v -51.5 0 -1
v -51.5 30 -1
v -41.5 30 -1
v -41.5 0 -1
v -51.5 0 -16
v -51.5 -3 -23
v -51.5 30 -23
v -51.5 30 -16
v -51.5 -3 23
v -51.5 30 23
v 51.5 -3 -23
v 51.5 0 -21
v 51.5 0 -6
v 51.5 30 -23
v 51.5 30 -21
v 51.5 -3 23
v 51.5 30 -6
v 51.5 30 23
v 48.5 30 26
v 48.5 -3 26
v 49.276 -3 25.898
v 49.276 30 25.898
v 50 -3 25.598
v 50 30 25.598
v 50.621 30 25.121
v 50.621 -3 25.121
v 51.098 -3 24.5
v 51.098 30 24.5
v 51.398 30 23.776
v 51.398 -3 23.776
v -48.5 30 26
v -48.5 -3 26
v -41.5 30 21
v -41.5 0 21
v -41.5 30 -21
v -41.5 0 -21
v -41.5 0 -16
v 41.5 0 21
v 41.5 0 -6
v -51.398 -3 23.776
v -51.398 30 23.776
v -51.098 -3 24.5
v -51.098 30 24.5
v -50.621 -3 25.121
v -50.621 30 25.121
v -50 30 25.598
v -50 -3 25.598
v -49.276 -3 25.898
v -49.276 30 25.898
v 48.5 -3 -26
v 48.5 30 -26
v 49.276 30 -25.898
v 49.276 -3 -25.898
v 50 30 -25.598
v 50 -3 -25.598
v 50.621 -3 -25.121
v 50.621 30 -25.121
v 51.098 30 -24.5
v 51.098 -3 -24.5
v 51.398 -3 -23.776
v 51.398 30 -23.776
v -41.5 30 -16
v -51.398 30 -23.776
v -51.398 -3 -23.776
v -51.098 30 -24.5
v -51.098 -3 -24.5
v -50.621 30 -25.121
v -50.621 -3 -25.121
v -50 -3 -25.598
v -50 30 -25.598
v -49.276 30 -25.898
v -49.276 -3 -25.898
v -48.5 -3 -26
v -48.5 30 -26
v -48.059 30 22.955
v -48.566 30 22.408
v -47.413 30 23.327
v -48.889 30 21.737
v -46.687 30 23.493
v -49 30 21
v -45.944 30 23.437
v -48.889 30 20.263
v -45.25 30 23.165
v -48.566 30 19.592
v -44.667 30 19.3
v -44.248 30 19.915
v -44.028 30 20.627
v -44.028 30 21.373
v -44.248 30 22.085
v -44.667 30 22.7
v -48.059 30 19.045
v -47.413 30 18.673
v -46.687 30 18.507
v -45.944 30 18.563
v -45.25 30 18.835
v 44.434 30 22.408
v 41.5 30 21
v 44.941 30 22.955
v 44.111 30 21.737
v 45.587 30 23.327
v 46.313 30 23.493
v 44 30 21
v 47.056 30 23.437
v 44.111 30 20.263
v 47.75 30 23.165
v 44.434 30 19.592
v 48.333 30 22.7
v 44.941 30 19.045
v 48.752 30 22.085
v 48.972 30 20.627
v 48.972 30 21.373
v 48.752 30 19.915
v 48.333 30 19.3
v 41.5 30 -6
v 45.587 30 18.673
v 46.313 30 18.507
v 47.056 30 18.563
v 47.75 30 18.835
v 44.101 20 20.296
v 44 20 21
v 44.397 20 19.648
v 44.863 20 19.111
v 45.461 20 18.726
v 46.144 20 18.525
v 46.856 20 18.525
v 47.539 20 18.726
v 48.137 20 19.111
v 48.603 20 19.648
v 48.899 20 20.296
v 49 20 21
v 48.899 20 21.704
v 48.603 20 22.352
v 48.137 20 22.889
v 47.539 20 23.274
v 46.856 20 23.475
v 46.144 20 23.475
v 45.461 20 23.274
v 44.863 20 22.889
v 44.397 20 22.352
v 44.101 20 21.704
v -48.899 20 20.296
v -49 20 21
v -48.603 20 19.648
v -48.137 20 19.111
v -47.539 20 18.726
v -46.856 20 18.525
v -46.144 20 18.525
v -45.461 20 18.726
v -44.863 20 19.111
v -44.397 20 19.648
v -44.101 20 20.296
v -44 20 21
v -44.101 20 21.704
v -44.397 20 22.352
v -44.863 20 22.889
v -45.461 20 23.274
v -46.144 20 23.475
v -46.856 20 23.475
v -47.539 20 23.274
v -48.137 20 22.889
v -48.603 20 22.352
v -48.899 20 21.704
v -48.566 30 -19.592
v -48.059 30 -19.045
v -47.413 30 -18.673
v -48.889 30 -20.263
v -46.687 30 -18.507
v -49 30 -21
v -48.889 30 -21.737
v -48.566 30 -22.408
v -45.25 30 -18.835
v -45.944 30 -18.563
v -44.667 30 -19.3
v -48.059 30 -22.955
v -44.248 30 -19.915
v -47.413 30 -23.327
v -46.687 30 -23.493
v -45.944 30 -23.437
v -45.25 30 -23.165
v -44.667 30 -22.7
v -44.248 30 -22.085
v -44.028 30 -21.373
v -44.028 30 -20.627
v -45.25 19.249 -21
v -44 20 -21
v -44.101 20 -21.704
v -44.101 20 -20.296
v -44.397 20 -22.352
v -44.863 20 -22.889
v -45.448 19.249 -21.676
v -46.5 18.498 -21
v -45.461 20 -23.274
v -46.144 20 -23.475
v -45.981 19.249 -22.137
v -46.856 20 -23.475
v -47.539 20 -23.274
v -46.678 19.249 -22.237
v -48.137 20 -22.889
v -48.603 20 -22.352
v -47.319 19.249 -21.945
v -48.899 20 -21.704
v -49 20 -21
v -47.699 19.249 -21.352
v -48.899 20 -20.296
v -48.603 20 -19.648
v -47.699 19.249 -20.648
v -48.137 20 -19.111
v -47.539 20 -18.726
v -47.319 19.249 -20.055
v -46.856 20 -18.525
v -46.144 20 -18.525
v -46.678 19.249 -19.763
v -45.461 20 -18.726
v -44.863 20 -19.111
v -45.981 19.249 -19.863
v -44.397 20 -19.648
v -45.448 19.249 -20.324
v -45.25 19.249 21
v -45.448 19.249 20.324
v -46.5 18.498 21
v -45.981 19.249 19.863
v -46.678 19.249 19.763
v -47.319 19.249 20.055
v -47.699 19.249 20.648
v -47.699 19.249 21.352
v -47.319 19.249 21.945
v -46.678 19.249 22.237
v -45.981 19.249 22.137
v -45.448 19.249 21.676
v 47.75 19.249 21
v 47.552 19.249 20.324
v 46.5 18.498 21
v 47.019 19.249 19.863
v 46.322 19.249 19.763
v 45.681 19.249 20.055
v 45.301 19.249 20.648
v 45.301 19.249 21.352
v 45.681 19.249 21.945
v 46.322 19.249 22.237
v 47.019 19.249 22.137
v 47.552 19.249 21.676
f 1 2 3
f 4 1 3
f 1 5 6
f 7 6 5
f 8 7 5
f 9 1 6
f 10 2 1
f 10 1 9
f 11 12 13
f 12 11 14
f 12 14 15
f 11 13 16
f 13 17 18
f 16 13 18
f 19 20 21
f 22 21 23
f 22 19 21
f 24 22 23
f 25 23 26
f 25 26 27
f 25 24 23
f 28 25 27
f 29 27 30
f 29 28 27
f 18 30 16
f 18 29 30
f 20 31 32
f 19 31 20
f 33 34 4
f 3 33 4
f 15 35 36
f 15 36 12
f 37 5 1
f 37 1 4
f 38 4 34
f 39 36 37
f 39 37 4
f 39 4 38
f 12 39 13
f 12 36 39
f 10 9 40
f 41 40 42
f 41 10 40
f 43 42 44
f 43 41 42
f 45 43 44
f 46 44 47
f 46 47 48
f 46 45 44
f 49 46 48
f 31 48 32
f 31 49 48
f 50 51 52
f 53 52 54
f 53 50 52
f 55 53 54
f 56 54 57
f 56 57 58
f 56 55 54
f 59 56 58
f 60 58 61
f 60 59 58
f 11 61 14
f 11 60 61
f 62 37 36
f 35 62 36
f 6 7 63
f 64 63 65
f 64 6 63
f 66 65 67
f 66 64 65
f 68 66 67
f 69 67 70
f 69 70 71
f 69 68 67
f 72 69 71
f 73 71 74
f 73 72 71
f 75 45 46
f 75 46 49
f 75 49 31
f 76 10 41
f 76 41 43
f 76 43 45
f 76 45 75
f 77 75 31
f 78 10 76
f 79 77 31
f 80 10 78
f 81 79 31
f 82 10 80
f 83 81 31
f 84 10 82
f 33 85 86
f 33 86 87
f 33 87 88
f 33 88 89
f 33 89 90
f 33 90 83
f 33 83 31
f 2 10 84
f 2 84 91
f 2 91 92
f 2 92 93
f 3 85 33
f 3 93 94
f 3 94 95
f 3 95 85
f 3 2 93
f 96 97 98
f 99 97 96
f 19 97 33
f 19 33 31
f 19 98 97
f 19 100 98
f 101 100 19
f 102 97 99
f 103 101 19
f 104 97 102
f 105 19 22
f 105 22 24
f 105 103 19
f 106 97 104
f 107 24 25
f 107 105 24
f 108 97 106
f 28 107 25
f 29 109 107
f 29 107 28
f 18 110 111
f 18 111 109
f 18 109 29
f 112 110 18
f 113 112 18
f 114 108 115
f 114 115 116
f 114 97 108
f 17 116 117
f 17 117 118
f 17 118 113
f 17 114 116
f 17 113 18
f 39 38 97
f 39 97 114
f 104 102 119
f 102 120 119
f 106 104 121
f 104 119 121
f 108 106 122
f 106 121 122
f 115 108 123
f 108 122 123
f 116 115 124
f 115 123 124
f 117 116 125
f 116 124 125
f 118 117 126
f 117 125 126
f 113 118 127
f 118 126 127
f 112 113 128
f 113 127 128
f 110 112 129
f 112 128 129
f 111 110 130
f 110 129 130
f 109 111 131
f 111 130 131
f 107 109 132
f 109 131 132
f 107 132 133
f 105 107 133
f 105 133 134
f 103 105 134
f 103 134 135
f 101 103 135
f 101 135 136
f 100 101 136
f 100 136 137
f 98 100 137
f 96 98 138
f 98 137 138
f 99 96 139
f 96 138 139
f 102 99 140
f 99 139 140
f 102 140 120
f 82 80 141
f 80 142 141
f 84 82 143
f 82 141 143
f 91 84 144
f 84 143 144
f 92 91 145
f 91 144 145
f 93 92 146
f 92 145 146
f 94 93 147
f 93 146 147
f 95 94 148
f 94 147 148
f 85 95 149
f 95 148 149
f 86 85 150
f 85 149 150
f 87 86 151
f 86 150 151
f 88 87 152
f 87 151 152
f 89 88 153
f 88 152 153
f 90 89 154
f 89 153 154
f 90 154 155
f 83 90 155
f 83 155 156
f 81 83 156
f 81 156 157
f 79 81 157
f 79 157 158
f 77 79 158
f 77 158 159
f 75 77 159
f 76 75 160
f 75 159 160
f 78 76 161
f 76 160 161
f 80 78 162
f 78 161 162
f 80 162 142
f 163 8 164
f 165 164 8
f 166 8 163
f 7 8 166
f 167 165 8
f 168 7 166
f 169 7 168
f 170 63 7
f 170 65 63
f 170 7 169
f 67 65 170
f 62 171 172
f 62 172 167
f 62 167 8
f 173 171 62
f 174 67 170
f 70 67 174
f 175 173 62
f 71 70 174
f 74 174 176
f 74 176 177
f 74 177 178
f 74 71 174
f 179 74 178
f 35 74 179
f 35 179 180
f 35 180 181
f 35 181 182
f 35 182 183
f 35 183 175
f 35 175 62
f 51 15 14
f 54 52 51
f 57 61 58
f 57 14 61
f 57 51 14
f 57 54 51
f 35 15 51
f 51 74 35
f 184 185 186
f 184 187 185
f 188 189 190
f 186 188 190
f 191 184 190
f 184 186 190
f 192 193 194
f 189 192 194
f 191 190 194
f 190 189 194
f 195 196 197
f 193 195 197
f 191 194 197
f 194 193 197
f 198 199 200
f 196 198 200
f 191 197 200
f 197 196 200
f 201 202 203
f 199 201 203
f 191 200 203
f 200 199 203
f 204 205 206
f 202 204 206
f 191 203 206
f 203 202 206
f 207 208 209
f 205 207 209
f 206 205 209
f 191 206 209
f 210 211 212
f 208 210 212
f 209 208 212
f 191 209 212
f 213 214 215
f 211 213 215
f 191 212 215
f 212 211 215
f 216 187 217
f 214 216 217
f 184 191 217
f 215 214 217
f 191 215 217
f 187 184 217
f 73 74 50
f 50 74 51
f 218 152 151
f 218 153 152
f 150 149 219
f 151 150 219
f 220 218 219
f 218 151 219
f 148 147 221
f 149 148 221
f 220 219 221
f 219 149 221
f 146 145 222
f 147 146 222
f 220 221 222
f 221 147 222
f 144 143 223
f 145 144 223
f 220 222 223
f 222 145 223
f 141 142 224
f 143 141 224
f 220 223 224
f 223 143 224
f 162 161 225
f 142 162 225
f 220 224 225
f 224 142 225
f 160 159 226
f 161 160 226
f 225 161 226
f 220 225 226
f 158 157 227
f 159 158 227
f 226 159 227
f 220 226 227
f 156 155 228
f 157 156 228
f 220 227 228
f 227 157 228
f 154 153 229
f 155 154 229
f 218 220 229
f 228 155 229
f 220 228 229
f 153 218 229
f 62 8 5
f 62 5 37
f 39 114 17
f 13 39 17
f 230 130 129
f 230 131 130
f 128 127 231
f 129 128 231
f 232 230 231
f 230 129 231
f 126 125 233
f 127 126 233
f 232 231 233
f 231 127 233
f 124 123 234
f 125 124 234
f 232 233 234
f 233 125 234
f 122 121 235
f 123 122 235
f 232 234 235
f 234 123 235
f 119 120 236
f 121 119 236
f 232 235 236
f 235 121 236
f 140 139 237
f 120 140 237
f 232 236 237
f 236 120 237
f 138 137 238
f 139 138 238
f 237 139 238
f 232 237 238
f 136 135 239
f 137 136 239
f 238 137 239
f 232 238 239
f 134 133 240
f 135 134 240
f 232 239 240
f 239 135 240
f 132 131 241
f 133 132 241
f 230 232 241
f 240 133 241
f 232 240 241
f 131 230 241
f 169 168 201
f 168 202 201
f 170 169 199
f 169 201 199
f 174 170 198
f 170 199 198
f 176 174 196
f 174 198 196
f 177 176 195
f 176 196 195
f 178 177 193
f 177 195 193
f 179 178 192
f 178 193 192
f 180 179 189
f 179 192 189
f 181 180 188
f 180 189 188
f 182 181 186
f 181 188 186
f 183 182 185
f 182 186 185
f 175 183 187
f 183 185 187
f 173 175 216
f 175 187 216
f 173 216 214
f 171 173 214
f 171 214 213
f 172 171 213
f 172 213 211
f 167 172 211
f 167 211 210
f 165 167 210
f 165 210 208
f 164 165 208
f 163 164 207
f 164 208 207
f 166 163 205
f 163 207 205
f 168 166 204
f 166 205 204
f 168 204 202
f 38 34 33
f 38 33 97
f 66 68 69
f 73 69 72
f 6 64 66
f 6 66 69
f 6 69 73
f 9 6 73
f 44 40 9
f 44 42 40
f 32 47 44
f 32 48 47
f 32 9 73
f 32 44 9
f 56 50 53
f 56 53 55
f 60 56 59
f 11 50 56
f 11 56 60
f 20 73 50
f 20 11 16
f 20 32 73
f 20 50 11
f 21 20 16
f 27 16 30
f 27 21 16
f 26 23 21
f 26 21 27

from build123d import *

# Parameters (mm, degrees)
SKETCH1_W                 = 103
SKETCH1_H                 = 52
SKETCH1_W_2               = 83
SKETCH1_H_2               = 42
BOSS_EXTRUDE1_DEPTH       = 30
SKETCH2_W                 = 103
SKETCH2_H                 = 52
BOSS_EXTRUDE2_DEPTH       = 3
SKETCH3_W                 = 10
SKETCH3_H                 = 15
CUT_EXTRUDE1_DEPTH        = 30
F_5_0MM_DOWEL_HOLE1_D     = 5
F_5_0MM_DOWEL_HOLE1_DEPTH = 10
F_5_0MM_DOWEL_HOLE1_TIP   = 1.502151548
FILLET1_R                 = 3


with BuildPart() as part:
    # Sketch1 → Boss-Extrude1 (new body)
    with BuildSketch(Plane(origin=(0, 0, 0), x_dir=(1, 0, 0), z_dir=(0, 1, 0))):
        Rectangle(SKETCH1_W, SKETCH1_H)
        Rectangle(SKETCH1_W_2, SKETCH1_H_2, mode=Mode.SUBTRACT)
    extrude(amount=BOSS_EXTRUDE1_DEPTH)

    # Sketch2 → Boss-Extrude2 (add)
    with BuildSketch(Plane.XZ):
        Rectangle(SKETCH2_W, SKETCH2_H)
    extrude(amount=BOSS_EXTRUDE2_DEPTH)

    # Sketch3 → Cut-Extrude1 (cut)
    with BuildSketch(Plane(origin=(0, 30, 0), x_dir=(1, 0, 0), z_dir=(0, 1, 0))):
        with Locations((46.5, 13.5)):
            Rectangle(SKETCH3_W, SKETCH3_H)
        with Locations((-46.5, 8.5)):
            Rectangle(SKETCH3_W, SKETCH3_H)
    extrude(amount=-CUT_EXTRUDE1_DEPTH, mode=Mode.SUBTRACT)

    # Ø5.0mm Dowel Hole1
    with Locations(Plane(origin=(0, 30, 0), x_dir=(1, 0, 0), z_dir=(0, 1, 0))):
        with Locations((-46.5, 21), (46.5, -21), (-46.5, -21)):
            Hole(F_5_0MM_DOWEL_HOLE1_D / 2, depth=F_5_0MM_DOWEL_HOLE1_DEPTH)
            with Locations((0, 0, -(F_5_0MM_DOWEL_HOLE1_DEPTH + F_5_0MM_DOWEL_HOLE1_TIP / 2))):  # 118° drill point
                Cone(0, F_5_0MM_DOWEL_HOLE1_D / 2, F_5_0MM_DOWEL_HOLE1_TIP, mode=Mode.SUBTRACT)

    # Fillet1
    fillet1_edges = [part.edges().sort_by_distance(p)[0] for p in [
        (51.5, 13.5, 26),
        (-51.5, 13.5, 26),
        (-51.5, 13.5, -26),
        (51.5, 13.5, -26),
    ]]
    fillet(fillet1_edges, radius=FILLET1_R)


solid = part.part
